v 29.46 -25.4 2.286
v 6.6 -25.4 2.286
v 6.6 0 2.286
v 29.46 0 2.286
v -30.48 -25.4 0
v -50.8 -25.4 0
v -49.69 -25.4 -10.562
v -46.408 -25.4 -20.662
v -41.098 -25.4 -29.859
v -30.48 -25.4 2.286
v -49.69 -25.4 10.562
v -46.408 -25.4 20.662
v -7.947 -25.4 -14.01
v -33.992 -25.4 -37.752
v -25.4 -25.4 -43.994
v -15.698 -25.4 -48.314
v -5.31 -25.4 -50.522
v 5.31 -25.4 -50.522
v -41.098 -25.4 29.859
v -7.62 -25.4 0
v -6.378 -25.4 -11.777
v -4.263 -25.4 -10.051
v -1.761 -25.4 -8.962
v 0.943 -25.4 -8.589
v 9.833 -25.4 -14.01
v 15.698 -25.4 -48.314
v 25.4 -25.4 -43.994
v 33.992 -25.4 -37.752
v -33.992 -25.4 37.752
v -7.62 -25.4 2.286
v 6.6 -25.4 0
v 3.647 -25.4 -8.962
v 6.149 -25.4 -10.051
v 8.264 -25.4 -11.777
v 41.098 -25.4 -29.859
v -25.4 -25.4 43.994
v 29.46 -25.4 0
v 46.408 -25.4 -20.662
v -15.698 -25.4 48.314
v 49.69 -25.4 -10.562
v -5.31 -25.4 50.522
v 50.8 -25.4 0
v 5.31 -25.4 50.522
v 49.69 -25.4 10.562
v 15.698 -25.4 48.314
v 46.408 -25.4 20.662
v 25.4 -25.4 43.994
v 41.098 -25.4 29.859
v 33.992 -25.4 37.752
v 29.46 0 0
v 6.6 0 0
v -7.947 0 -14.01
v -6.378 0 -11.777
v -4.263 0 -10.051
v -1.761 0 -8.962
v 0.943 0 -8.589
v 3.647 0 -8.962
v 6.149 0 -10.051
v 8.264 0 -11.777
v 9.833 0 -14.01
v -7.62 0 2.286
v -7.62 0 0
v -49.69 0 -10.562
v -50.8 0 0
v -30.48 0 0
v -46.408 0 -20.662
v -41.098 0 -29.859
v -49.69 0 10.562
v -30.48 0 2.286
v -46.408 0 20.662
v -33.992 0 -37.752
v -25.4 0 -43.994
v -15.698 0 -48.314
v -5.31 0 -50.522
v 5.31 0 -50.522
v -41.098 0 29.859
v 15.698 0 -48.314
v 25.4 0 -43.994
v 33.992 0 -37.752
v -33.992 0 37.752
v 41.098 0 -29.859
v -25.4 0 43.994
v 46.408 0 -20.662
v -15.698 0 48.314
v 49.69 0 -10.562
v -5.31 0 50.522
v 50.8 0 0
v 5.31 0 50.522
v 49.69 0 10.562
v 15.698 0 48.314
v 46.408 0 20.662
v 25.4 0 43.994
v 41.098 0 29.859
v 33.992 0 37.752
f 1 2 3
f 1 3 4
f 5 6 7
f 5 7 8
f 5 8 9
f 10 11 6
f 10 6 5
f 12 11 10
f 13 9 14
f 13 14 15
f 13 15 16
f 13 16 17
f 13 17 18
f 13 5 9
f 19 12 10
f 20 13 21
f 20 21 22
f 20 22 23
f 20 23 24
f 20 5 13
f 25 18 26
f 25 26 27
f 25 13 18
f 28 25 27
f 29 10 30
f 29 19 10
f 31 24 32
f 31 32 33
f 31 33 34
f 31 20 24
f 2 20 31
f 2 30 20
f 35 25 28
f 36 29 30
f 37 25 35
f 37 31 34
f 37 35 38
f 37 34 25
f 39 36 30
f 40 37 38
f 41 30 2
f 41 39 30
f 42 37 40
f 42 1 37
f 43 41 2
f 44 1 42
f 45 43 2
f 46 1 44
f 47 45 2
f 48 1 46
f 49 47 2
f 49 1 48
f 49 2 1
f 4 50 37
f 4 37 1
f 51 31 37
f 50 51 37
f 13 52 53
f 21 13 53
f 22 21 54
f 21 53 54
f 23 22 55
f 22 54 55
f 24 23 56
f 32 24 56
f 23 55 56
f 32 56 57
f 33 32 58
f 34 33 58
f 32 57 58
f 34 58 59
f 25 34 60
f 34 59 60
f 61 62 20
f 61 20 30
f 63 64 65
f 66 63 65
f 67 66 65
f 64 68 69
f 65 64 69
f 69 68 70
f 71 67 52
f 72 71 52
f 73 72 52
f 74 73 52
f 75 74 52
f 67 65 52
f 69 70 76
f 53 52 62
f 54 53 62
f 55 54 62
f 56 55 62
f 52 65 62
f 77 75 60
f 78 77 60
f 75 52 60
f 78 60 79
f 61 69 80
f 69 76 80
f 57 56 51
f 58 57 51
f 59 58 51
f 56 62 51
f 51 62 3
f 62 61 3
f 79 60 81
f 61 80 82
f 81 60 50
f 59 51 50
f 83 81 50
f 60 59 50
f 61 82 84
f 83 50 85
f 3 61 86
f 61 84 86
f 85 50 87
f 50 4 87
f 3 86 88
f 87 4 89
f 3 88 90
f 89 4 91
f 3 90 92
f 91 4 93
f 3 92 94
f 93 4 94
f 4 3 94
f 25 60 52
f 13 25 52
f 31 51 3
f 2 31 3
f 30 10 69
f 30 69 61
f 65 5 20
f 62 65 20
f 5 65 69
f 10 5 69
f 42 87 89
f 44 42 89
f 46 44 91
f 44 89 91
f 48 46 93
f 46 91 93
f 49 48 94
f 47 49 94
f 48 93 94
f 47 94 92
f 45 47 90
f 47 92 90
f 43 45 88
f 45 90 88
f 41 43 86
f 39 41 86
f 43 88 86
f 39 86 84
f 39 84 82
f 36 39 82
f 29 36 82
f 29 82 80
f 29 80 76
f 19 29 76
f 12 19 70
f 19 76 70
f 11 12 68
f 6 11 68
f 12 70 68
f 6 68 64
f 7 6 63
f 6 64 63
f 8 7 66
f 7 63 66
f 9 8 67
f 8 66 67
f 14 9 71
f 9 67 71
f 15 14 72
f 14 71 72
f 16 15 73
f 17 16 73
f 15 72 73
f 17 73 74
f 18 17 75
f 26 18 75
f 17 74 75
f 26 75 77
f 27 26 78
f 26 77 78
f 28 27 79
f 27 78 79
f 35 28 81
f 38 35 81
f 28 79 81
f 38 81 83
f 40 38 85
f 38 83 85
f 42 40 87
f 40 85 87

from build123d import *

# Parameters (mm, degrees)
F0_R     = 50.8
F0_W     = 22.86
F0_H     = 2.286
F1_DEPTH = 25.4


with BuildPart() as f1:
    # F0 (on Front) → F1 (new body)
    with BuildSketch(Plane.XZ):
        Circle(F0_R)
        with BuildLine():
            Line((9.832879, -14.010016), (-7.947121, -14.010016))
            ThreePointArc((-7.947121, -14.010016), (0.942879, -8.589429), (9.832879, -14.010016))
        make_face(mode=Mode.SUBTRACT)
        with Locations((-19.05, 1.143)):
            Rectangle(F0_W, F0_H, mode=Mode.SUBTRACT)
        with Locations((18.03015, 1.143)):
            Rectangle(F0_W, F0_H, mode=Mode.SUBTRACT)
    extrude(amount=F1_DEPTH)


solid = f1.part
